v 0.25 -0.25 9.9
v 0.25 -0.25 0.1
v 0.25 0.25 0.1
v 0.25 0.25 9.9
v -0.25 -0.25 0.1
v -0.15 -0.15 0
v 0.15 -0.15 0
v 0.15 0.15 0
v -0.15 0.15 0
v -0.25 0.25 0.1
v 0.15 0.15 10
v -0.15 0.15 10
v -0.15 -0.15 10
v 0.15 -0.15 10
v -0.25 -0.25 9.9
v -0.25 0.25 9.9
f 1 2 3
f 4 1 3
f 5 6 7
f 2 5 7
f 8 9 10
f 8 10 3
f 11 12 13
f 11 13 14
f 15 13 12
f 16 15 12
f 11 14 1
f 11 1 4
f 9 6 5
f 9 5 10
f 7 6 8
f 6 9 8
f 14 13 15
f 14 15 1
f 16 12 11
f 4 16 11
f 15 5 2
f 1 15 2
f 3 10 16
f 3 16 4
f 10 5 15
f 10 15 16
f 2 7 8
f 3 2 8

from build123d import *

# Parameters (mm, degrees)
SKETCH_1_W      = 0.5
SKETCH_1_H      = 0.5
EXTRUDE_1_DEPTH = 10
CHAMFER_1_SIZE  = 0.1


with BuildPart() as part:
    # 草图1 → 凸台-拉伸1 (new body)
    with BuildSketch(Plane.XY):
        Rectangle(SKETCH_1_W, SKETCH_1_H)
    extrude(amount=EXTRUDE_1_DEPTH)

    # 倒角1
    chamfer_1_edges = [part.edges().sort_by_distance(p)[0] for p in [
        (-0.25, 0, 10),
        (0, -0.25, 10),
        (0.25, 0, 10),
        (0, -0.25, 0),
        (-0.25, 0, 0),
        (0, 0.25, 0),
        (0.25, 0, 0),
        (0, 0.25, 10),
    ]]
    chamfer(chamfer_1_edges, length=CHAMFER_1_SIZE)


solid = part.part
